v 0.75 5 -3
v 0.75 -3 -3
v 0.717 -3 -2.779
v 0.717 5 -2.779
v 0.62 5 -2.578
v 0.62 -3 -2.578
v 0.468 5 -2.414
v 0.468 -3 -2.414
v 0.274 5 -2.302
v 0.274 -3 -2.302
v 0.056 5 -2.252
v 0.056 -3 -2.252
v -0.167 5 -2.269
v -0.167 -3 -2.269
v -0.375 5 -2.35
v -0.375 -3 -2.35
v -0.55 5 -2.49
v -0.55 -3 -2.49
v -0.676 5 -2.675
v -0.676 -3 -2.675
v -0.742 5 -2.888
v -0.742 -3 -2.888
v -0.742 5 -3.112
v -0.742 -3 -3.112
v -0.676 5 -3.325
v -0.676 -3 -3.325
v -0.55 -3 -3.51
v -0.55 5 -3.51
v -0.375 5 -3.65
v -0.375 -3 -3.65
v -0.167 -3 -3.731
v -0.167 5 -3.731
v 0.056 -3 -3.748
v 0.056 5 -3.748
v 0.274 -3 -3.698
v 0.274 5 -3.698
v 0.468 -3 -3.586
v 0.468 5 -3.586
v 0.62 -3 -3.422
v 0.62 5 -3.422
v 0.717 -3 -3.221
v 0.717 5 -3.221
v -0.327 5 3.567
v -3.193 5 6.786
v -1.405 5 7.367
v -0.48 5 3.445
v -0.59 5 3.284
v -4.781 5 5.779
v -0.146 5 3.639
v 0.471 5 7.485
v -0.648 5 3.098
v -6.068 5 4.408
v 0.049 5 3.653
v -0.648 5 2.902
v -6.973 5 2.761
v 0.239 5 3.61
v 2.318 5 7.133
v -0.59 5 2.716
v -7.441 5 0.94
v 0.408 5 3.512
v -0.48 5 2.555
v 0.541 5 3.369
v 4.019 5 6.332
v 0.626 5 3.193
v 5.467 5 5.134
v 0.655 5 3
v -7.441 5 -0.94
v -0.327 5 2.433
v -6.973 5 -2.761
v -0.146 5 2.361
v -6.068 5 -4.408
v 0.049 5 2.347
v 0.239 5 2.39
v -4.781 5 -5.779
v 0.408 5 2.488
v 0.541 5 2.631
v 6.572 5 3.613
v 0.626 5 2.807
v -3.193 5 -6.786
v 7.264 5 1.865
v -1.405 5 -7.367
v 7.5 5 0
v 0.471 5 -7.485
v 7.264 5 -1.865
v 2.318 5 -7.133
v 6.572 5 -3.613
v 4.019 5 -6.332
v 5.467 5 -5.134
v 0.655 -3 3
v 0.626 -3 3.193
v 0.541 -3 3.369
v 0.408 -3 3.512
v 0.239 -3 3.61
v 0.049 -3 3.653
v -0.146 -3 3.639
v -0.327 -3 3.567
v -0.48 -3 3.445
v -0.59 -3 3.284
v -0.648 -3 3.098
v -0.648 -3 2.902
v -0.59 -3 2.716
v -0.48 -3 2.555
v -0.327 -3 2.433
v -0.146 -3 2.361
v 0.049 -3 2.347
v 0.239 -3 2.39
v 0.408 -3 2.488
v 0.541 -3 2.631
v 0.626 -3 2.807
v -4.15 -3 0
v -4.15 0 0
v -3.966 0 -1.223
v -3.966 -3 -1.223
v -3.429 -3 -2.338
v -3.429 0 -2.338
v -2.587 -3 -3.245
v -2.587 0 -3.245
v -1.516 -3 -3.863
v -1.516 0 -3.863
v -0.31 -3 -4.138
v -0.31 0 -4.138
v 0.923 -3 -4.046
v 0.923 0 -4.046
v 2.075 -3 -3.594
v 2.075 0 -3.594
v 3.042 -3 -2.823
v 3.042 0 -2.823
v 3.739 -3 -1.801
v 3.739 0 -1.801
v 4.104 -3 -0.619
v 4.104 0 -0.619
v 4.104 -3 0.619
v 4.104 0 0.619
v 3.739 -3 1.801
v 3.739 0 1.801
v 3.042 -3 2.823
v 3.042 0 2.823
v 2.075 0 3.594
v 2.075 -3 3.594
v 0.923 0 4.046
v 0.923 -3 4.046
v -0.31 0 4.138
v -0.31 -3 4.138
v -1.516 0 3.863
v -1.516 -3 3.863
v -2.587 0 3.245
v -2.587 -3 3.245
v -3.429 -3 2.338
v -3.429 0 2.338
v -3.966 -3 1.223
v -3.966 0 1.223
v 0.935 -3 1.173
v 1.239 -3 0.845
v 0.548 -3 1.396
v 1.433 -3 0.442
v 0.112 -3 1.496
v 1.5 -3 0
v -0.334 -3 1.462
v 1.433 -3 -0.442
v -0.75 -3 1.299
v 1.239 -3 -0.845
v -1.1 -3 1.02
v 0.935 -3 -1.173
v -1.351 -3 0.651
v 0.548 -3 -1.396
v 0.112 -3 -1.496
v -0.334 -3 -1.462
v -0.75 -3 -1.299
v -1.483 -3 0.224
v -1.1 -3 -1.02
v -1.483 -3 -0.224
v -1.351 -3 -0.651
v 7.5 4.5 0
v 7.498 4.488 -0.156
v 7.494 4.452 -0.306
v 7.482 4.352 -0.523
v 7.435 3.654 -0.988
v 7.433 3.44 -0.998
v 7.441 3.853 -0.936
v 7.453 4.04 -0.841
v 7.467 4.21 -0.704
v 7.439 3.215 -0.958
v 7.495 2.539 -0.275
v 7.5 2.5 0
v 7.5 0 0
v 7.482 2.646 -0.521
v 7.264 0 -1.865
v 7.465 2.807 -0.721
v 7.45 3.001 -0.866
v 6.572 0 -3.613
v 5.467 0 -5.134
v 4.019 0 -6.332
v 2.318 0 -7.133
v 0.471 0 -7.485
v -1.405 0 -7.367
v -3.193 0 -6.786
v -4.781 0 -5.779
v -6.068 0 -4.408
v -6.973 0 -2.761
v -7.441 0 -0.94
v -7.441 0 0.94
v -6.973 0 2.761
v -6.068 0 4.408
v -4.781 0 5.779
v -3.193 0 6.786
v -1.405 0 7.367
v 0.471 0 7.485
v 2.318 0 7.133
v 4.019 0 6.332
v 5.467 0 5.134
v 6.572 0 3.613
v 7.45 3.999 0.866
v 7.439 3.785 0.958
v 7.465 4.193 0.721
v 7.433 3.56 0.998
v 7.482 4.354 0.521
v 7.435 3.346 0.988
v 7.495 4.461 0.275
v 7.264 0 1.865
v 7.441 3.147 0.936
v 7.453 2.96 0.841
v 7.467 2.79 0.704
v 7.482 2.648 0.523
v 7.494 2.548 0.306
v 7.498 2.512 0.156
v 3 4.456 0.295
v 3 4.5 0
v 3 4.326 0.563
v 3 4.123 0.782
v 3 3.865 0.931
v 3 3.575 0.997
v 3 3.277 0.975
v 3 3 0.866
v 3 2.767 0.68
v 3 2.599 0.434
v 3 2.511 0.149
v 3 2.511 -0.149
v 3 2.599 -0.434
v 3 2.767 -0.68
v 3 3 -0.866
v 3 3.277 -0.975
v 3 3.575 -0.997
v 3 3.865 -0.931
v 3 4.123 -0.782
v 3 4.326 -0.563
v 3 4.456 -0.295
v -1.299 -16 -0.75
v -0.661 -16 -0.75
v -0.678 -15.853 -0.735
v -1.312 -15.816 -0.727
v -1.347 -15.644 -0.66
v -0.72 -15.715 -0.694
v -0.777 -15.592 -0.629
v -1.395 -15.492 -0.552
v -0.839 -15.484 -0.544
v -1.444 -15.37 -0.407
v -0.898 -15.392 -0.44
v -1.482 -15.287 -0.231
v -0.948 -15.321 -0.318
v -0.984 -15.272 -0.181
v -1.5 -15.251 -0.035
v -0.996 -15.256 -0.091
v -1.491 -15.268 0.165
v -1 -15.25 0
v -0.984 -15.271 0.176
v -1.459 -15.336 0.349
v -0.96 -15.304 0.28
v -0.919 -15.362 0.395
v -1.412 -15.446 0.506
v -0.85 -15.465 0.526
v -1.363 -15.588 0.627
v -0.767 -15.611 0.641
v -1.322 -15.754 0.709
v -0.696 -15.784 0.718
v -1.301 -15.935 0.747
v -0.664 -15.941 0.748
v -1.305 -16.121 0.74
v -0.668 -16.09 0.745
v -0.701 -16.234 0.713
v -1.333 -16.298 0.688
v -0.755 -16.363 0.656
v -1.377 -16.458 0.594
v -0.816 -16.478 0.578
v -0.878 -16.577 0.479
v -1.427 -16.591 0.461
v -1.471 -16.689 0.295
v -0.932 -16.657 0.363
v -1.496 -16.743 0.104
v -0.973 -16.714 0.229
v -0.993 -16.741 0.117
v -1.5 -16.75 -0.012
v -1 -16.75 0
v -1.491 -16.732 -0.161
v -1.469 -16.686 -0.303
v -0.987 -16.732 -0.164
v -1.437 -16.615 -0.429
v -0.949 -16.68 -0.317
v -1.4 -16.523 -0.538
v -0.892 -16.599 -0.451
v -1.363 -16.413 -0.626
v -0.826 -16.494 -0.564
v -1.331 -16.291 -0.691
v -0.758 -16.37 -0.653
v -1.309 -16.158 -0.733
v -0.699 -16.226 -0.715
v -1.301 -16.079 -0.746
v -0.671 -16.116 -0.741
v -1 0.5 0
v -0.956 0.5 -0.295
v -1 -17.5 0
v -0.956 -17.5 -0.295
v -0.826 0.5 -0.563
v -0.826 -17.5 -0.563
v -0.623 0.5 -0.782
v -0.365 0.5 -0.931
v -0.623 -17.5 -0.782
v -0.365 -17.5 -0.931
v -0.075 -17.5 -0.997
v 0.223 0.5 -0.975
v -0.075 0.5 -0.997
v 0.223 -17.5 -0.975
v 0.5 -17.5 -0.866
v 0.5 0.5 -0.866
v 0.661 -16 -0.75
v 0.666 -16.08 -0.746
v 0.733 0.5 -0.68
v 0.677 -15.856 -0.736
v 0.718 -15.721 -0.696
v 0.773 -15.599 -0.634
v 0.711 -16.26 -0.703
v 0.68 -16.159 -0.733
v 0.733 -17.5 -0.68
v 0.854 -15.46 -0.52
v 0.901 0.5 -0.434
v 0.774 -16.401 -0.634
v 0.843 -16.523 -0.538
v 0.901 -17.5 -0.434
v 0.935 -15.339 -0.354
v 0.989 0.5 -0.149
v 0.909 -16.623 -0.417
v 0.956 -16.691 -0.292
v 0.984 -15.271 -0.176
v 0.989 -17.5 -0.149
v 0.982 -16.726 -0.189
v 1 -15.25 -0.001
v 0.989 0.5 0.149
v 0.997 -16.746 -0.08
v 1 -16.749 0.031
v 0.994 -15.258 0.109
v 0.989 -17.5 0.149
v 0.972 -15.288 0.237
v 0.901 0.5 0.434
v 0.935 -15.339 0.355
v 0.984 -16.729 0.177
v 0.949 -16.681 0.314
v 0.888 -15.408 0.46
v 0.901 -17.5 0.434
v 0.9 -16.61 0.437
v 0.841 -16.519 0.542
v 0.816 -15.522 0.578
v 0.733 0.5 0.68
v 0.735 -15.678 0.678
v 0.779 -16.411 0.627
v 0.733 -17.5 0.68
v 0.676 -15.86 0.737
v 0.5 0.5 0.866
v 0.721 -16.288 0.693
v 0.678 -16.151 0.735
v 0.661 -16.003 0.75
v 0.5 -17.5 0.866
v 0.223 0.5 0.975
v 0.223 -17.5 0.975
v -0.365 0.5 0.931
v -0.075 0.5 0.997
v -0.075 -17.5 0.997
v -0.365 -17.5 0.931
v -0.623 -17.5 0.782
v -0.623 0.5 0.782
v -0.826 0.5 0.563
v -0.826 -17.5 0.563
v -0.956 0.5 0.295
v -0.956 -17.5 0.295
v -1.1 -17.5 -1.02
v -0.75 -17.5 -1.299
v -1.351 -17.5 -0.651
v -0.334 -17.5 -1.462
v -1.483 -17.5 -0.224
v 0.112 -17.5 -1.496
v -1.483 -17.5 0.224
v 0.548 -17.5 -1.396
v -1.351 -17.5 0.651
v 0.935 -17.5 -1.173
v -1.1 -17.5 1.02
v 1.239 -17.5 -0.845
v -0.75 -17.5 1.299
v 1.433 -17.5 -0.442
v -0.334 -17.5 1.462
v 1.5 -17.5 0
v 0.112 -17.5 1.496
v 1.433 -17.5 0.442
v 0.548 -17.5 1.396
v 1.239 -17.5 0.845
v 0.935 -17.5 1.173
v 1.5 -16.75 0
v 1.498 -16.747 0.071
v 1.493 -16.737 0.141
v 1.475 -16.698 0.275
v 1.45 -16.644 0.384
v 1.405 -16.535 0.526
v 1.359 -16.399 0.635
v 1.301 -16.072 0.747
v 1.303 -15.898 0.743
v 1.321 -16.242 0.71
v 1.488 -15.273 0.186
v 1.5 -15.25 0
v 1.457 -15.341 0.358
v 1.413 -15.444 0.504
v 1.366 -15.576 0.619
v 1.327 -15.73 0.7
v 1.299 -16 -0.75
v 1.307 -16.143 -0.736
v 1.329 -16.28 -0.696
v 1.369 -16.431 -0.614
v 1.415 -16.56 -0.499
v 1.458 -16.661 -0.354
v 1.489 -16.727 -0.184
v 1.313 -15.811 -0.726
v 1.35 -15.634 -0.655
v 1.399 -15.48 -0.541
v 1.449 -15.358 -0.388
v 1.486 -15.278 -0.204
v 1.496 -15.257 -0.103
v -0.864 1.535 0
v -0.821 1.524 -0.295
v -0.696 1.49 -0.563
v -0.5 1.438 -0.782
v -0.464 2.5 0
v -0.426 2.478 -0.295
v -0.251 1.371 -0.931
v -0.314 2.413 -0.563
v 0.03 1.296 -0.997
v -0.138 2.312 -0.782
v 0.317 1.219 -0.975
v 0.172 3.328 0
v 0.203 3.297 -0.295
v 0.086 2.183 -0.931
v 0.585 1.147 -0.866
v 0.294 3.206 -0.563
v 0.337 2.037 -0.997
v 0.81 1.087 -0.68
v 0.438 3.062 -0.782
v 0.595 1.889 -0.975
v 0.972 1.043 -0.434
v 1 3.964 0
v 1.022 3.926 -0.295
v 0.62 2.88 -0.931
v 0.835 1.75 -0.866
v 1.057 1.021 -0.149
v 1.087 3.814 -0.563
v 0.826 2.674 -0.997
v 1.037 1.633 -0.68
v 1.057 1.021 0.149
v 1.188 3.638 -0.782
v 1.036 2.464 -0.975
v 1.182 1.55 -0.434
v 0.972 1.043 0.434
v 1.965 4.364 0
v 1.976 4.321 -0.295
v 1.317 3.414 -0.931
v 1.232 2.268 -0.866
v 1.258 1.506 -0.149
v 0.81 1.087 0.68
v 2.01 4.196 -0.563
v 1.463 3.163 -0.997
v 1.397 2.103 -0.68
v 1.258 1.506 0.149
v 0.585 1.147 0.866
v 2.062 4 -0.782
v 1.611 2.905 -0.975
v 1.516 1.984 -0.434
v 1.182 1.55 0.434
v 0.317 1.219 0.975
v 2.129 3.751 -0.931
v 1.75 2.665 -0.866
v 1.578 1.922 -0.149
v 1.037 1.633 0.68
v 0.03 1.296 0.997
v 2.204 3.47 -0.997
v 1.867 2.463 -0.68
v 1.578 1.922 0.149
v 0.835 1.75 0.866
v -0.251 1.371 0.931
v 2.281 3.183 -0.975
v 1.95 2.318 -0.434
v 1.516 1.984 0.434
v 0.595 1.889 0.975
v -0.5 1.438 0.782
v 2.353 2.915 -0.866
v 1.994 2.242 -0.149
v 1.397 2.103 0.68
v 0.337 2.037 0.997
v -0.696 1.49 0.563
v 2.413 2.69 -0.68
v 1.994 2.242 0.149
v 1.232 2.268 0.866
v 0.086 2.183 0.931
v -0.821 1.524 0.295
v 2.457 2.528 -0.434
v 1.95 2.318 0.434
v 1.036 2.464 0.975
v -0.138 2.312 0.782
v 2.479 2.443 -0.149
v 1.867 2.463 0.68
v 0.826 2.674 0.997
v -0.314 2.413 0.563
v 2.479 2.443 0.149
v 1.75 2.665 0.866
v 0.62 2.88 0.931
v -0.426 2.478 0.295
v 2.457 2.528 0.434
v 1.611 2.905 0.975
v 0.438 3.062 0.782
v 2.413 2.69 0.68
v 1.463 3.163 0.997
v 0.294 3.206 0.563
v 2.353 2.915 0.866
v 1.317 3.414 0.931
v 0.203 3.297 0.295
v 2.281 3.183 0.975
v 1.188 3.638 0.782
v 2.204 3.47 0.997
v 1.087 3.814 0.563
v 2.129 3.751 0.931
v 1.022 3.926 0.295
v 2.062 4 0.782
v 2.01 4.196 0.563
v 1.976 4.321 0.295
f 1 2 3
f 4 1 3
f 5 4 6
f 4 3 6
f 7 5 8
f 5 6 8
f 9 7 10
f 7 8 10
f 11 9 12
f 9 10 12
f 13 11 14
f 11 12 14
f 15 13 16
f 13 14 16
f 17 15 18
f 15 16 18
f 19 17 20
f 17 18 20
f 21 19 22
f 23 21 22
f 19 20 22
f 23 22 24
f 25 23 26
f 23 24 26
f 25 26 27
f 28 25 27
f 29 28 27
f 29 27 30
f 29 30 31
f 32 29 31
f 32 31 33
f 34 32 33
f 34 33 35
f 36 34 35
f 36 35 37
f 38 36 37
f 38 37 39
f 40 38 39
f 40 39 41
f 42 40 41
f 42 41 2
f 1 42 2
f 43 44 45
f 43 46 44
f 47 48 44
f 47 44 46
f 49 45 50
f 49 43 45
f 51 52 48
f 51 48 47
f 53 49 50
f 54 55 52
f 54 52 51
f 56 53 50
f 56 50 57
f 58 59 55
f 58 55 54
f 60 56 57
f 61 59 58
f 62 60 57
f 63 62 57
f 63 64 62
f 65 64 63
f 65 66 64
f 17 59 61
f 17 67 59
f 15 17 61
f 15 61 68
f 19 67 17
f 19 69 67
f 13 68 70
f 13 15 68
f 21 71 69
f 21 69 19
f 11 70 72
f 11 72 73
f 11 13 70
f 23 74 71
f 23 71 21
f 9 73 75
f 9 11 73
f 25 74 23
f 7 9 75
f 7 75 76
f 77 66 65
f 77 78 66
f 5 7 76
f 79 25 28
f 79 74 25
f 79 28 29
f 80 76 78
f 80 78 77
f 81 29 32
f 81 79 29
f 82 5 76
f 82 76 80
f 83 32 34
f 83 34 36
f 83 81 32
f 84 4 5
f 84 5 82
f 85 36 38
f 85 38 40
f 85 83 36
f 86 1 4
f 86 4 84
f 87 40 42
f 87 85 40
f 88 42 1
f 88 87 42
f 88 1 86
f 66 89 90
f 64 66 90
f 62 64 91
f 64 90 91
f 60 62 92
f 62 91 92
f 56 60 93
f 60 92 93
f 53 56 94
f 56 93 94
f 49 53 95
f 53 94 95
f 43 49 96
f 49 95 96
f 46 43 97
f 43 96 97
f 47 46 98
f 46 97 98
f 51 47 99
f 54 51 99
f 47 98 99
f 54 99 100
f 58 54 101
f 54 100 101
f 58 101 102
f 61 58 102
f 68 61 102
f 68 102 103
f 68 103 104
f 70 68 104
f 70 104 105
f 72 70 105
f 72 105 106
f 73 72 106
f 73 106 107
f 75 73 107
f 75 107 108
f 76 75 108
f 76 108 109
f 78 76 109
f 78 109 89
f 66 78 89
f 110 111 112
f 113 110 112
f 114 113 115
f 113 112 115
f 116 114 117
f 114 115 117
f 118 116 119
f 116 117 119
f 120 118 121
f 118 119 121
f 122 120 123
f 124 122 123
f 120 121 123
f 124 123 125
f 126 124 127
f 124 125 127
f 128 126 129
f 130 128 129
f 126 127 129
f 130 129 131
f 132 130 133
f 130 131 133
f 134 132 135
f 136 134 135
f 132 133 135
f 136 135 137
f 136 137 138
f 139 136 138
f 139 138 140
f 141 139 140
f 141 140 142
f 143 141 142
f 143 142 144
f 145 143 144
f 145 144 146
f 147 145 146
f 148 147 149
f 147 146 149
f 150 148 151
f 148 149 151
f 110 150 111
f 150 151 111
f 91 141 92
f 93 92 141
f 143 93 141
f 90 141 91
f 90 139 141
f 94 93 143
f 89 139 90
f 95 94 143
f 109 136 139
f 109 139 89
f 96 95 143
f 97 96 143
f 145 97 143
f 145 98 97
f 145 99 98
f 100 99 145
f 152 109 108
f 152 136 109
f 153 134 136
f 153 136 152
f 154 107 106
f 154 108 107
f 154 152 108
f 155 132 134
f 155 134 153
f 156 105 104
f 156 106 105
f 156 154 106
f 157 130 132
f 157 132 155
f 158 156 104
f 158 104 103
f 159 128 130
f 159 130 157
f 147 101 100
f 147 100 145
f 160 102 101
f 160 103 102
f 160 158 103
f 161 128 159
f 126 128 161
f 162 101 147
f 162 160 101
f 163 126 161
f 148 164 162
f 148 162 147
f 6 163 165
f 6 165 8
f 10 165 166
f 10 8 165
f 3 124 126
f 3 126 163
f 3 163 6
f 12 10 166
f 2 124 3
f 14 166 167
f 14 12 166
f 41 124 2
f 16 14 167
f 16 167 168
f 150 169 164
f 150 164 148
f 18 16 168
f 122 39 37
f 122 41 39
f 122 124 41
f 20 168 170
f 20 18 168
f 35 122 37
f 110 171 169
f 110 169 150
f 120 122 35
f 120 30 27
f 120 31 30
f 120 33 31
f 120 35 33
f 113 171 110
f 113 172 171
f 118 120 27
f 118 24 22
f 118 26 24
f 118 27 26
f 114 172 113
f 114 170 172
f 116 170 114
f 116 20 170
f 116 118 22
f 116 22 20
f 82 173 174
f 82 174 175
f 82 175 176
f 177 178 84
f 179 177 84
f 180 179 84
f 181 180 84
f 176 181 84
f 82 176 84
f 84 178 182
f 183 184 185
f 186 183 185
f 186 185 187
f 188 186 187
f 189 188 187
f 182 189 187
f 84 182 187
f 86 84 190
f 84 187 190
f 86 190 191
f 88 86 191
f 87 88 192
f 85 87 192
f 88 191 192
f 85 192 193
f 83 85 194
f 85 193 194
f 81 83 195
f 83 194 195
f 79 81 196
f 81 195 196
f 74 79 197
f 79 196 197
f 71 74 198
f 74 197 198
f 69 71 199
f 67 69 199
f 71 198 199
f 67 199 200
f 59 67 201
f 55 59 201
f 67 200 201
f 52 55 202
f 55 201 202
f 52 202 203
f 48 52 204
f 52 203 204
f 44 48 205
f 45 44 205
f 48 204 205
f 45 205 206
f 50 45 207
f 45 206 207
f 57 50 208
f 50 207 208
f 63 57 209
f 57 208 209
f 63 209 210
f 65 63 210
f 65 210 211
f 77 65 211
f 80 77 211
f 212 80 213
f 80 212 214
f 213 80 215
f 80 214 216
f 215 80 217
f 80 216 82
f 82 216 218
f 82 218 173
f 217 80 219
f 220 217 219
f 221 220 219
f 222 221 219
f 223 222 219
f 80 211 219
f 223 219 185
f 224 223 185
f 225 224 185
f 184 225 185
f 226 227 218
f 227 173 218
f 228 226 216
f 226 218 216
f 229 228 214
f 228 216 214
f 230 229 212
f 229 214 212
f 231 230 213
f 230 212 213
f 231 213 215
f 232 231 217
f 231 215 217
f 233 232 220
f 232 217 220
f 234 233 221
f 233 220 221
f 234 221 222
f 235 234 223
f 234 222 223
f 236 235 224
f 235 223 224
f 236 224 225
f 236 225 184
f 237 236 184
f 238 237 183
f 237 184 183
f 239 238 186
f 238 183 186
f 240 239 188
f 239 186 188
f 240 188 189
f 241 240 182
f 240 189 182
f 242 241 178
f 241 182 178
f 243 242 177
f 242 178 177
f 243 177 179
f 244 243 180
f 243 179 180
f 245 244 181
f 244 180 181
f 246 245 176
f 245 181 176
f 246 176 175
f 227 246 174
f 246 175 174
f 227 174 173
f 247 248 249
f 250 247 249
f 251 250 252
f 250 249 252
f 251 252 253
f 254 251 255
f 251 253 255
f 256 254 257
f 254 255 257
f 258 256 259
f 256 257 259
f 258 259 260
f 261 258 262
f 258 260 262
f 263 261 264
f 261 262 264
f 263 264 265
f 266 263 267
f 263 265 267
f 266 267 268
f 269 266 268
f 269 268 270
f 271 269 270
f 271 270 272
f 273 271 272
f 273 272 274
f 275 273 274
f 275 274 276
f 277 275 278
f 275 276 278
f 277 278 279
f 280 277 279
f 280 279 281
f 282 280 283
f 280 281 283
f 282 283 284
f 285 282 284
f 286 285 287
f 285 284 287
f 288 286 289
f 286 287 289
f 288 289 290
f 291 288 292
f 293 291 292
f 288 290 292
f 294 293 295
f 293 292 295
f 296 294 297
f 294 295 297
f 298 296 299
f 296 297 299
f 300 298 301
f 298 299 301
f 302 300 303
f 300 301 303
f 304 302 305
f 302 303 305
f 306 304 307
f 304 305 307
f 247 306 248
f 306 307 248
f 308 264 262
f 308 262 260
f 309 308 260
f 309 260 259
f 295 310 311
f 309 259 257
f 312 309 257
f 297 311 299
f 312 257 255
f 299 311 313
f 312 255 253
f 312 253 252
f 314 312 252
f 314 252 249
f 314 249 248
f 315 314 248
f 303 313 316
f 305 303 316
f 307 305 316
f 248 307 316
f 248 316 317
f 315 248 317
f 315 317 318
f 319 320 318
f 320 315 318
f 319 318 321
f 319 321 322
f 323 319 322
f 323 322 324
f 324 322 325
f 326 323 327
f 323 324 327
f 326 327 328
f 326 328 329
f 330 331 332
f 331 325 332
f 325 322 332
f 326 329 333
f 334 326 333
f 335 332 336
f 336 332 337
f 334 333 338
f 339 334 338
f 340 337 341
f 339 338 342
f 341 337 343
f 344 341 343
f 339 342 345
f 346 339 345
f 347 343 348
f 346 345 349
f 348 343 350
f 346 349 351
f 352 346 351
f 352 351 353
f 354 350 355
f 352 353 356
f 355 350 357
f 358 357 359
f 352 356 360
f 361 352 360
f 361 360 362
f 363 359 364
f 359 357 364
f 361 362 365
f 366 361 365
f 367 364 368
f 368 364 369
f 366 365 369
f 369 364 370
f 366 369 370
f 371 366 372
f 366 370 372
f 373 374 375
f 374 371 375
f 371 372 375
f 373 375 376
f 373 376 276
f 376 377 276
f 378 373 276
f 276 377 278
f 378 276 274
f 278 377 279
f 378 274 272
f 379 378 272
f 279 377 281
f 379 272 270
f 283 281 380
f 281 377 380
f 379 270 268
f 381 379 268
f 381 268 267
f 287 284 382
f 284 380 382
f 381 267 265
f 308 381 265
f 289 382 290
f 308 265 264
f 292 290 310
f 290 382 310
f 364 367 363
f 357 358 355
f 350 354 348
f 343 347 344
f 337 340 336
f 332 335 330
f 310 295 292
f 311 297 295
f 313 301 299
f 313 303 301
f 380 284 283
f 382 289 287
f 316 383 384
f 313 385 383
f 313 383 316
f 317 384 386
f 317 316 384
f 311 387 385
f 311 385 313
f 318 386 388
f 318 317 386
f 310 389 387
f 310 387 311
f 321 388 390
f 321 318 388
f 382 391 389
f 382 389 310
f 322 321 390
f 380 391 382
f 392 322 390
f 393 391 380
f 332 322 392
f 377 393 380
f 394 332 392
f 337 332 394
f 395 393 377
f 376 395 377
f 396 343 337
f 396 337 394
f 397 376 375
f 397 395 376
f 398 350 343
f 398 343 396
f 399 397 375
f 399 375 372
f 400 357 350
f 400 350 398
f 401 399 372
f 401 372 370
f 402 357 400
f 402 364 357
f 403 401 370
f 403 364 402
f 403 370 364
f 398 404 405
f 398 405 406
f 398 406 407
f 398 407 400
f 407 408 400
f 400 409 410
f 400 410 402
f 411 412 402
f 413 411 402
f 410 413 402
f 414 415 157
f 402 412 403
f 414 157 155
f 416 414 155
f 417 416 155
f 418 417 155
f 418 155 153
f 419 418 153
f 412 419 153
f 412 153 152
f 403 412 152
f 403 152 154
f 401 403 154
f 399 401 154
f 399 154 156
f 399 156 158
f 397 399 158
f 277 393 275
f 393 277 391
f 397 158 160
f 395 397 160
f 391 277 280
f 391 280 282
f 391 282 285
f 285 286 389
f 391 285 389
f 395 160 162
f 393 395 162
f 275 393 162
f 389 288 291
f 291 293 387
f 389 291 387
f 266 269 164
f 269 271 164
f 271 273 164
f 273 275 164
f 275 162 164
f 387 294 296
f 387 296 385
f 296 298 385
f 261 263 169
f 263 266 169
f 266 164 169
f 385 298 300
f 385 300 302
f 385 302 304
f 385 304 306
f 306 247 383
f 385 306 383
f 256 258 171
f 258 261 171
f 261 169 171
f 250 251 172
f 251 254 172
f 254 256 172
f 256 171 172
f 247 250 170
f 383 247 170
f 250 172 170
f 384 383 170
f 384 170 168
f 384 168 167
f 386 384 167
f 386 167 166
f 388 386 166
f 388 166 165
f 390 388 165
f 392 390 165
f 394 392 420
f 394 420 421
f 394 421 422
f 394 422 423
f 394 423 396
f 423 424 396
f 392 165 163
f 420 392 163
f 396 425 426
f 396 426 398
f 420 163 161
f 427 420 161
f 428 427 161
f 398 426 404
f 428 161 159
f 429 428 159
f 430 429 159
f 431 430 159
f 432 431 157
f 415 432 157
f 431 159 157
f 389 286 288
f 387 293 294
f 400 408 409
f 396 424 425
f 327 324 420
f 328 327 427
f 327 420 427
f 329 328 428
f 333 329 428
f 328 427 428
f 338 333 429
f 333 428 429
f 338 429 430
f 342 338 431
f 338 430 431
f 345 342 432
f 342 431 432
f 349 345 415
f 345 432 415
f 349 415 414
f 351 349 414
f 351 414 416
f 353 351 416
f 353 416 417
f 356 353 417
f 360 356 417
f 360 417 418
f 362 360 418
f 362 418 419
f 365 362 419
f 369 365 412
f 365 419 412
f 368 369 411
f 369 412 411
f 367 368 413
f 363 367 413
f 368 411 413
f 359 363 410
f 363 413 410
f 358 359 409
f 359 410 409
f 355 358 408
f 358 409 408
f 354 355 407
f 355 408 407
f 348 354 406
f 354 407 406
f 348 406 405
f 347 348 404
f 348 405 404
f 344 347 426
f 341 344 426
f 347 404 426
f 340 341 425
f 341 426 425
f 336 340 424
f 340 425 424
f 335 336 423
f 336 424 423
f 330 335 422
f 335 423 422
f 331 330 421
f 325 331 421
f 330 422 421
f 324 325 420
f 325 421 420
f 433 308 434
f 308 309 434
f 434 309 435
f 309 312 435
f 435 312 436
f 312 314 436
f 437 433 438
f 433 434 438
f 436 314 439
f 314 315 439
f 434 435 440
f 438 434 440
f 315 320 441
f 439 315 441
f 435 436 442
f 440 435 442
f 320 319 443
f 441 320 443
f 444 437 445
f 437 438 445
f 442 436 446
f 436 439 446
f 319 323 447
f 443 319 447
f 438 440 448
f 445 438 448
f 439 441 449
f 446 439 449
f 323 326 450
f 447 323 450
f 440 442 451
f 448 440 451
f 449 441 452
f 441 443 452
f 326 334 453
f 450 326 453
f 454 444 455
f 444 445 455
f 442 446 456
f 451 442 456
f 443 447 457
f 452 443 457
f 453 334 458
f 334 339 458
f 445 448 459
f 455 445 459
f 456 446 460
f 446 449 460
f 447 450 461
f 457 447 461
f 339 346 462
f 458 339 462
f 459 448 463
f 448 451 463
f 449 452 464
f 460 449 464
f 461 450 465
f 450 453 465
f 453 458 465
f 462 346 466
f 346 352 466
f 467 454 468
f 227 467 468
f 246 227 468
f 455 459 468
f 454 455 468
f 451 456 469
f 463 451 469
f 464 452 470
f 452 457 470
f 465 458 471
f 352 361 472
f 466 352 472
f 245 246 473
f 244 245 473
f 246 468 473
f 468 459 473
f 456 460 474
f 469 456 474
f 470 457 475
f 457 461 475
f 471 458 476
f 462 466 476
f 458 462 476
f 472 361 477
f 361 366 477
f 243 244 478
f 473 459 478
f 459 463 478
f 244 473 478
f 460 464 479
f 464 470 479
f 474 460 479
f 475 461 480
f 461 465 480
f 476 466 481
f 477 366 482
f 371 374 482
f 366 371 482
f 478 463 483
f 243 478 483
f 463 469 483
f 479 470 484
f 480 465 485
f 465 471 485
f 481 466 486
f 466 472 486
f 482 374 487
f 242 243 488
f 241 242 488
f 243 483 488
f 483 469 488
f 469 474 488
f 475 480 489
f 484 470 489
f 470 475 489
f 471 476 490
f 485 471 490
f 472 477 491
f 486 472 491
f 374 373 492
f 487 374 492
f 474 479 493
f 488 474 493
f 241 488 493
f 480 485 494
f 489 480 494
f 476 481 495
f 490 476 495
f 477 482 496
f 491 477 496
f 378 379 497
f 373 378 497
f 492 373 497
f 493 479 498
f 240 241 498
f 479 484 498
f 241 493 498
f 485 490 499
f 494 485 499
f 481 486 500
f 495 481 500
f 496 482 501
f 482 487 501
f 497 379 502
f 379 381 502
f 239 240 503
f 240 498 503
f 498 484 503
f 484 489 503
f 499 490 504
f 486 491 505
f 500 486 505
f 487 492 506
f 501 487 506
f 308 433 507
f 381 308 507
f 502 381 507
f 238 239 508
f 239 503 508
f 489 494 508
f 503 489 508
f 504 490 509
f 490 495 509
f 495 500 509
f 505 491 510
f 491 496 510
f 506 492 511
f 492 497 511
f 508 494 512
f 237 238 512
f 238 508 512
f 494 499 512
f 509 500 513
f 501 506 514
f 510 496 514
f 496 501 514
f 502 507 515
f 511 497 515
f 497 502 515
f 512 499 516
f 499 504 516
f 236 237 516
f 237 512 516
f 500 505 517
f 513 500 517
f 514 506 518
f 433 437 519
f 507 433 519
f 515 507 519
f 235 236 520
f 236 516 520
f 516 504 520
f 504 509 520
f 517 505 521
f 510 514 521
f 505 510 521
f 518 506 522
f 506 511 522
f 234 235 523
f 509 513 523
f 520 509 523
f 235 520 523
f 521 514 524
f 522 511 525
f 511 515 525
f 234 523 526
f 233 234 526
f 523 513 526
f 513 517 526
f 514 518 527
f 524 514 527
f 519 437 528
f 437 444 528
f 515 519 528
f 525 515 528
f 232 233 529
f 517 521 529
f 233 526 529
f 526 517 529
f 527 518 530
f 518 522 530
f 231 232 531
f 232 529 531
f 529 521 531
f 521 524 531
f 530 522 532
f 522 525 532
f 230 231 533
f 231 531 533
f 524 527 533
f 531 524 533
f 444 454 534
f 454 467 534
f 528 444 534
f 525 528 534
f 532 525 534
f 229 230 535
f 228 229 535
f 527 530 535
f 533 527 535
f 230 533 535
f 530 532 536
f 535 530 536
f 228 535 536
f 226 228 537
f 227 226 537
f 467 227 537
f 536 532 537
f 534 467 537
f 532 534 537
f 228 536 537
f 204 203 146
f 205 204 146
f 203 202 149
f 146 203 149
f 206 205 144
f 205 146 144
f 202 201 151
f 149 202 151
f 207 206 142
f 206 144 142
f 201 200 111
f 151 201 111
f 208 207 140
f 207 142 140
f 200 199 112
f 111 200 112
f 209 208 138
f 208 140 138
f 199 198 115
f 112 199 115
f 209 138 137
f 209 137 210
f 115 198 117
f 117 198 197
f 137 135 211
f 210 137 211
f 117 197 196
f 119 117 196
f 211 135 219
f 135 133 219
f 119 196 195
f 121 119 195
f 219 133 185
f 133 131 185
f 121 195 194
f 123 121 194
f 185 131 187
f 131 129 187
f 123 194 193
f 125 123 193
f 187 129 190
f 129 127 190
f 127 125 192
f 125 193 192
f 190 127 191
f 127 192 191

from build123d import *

# Parameters (mm, degrees)
SKETCH1_R           = 7.5
BOSS_EXTRUDE1_DEPTH = 5
SKETCH6_R           = 1
SKETCH12_R          = 4.15
BOSS_EXTRUDE2_DEPTH = 3
SKETCH13_R          = 1.5
BOSS_EXTRUDE3_DEPTH = 14.5
CUT_EXTRUDE5_REACH  = 24.5
SKETCH21_R          = 1
SKETCH22_R          = 0.75
CUT_EXTRUDE6_DEPTH  = 18.5000001
SKETCH23_R          = 0.654937639
SKETCH23_R_2        = 0.75
CUT_EXTRUDE7_DEPTH  = 10


with BuildPart() as part:
    # Sketch1 → Boss-Extrude1 (new body)
    with BuildSketch(Plane(origin=(0, 0, 0), x_dir=(1, 0, 0), z_dir=(0, 1, 0))):
        Circle(SKETCH1_R)
    extrude(amount=BOSS_EXTRUDE1_DEPTH)

    # Cut-Sweep2: sweep along a path in Sketch5
    with BuildLine(Plane.XY) as cut_sweep2_path:
        Line((0, 0), (0, 0.5))
        ThreePointArc((0, 0.5), (0.878679656, 2.621320344), (3, 3.5))
        Line((3, 3.5), (7.5, 3.5))
    # Sketch6 → Cut-Sweep2 (sweep, cut)
    with BuildSketch(Plane(origin=(0, 0, 0), x_dir=(-1, 0, 0), z_dir=(0, -1, 0))):
        Circle(SKETCH6_R)
    sweep(path=cut_sweep2_path.line, mode=Mode.SUBTRACT)

    # Sketch12 → Boss-Extrude2 (add)
    with BuildSketch(Plane(origin=(0, 0, 0), x_dir=(-1, 0, 0), z_dir=(0, -1, 0))):
        Circle(SKETCH12_R)
    extrude(amount=BOSS_EXTRUDE2_DEPTH)

    # Sketch13 → Boss-Extrude3 (add)
    with BuildSketch(Plane.XZ.offset(3)):
        Circle(SKETCH13_R)
    extrude(amount=BOSS_EXTRUDE3_DEPTH)

    # Sketch21 → Cut-Extrude5 (cut, up to next)
    with BuildSketch(Plane(origin=(0, -17.5, 0), x_dir=(-1, 0, 0), z_dir=(0, -1, 0)), mode=Mode.PRIVATE) as cut_extrude5_sk1:
        Circle(SKETCH21_R)
    cut_extrude5_tool1 = extrude(cut_extrude5_sk1.sketch, amount=-CUT_EXTRUDE5_REACH, mode=Mode.PRIVATE) & part.part
    add(cut_extrude5_tool1.solids().sort_by_distance((0, -17.5, 0))[0], mode=Mode.SUBTRACT)

    # Sketch22 → Cut-Extrude6 (cut, through all)
    with BuildSketch(Plane(origin=(10, 0, 0), x_dir=(0, 0, -1), z_dir=(1, 0, 0))):
        with Locations((0, -16)):
            Circle(SKETCH22_R)
    extrude(amount=-CUT_EXTRUDE6_DEPTH, mode=Mode.SUBTRACT)

    # Sketch23 → Cut-Extrude7 (cut)
    with BuildSketch(Plane.XZ.offset(3)):
        with Locations((0, 3)):
            Circle(SKETCH23_R)
        with Locations((0, -3)):
            Circle(SKETCH23_R_2)
    extrude(amount=-CUT_EXTRUDE7_DEPTH, mode=Mode.SUBTRACT)


solid = part.part
